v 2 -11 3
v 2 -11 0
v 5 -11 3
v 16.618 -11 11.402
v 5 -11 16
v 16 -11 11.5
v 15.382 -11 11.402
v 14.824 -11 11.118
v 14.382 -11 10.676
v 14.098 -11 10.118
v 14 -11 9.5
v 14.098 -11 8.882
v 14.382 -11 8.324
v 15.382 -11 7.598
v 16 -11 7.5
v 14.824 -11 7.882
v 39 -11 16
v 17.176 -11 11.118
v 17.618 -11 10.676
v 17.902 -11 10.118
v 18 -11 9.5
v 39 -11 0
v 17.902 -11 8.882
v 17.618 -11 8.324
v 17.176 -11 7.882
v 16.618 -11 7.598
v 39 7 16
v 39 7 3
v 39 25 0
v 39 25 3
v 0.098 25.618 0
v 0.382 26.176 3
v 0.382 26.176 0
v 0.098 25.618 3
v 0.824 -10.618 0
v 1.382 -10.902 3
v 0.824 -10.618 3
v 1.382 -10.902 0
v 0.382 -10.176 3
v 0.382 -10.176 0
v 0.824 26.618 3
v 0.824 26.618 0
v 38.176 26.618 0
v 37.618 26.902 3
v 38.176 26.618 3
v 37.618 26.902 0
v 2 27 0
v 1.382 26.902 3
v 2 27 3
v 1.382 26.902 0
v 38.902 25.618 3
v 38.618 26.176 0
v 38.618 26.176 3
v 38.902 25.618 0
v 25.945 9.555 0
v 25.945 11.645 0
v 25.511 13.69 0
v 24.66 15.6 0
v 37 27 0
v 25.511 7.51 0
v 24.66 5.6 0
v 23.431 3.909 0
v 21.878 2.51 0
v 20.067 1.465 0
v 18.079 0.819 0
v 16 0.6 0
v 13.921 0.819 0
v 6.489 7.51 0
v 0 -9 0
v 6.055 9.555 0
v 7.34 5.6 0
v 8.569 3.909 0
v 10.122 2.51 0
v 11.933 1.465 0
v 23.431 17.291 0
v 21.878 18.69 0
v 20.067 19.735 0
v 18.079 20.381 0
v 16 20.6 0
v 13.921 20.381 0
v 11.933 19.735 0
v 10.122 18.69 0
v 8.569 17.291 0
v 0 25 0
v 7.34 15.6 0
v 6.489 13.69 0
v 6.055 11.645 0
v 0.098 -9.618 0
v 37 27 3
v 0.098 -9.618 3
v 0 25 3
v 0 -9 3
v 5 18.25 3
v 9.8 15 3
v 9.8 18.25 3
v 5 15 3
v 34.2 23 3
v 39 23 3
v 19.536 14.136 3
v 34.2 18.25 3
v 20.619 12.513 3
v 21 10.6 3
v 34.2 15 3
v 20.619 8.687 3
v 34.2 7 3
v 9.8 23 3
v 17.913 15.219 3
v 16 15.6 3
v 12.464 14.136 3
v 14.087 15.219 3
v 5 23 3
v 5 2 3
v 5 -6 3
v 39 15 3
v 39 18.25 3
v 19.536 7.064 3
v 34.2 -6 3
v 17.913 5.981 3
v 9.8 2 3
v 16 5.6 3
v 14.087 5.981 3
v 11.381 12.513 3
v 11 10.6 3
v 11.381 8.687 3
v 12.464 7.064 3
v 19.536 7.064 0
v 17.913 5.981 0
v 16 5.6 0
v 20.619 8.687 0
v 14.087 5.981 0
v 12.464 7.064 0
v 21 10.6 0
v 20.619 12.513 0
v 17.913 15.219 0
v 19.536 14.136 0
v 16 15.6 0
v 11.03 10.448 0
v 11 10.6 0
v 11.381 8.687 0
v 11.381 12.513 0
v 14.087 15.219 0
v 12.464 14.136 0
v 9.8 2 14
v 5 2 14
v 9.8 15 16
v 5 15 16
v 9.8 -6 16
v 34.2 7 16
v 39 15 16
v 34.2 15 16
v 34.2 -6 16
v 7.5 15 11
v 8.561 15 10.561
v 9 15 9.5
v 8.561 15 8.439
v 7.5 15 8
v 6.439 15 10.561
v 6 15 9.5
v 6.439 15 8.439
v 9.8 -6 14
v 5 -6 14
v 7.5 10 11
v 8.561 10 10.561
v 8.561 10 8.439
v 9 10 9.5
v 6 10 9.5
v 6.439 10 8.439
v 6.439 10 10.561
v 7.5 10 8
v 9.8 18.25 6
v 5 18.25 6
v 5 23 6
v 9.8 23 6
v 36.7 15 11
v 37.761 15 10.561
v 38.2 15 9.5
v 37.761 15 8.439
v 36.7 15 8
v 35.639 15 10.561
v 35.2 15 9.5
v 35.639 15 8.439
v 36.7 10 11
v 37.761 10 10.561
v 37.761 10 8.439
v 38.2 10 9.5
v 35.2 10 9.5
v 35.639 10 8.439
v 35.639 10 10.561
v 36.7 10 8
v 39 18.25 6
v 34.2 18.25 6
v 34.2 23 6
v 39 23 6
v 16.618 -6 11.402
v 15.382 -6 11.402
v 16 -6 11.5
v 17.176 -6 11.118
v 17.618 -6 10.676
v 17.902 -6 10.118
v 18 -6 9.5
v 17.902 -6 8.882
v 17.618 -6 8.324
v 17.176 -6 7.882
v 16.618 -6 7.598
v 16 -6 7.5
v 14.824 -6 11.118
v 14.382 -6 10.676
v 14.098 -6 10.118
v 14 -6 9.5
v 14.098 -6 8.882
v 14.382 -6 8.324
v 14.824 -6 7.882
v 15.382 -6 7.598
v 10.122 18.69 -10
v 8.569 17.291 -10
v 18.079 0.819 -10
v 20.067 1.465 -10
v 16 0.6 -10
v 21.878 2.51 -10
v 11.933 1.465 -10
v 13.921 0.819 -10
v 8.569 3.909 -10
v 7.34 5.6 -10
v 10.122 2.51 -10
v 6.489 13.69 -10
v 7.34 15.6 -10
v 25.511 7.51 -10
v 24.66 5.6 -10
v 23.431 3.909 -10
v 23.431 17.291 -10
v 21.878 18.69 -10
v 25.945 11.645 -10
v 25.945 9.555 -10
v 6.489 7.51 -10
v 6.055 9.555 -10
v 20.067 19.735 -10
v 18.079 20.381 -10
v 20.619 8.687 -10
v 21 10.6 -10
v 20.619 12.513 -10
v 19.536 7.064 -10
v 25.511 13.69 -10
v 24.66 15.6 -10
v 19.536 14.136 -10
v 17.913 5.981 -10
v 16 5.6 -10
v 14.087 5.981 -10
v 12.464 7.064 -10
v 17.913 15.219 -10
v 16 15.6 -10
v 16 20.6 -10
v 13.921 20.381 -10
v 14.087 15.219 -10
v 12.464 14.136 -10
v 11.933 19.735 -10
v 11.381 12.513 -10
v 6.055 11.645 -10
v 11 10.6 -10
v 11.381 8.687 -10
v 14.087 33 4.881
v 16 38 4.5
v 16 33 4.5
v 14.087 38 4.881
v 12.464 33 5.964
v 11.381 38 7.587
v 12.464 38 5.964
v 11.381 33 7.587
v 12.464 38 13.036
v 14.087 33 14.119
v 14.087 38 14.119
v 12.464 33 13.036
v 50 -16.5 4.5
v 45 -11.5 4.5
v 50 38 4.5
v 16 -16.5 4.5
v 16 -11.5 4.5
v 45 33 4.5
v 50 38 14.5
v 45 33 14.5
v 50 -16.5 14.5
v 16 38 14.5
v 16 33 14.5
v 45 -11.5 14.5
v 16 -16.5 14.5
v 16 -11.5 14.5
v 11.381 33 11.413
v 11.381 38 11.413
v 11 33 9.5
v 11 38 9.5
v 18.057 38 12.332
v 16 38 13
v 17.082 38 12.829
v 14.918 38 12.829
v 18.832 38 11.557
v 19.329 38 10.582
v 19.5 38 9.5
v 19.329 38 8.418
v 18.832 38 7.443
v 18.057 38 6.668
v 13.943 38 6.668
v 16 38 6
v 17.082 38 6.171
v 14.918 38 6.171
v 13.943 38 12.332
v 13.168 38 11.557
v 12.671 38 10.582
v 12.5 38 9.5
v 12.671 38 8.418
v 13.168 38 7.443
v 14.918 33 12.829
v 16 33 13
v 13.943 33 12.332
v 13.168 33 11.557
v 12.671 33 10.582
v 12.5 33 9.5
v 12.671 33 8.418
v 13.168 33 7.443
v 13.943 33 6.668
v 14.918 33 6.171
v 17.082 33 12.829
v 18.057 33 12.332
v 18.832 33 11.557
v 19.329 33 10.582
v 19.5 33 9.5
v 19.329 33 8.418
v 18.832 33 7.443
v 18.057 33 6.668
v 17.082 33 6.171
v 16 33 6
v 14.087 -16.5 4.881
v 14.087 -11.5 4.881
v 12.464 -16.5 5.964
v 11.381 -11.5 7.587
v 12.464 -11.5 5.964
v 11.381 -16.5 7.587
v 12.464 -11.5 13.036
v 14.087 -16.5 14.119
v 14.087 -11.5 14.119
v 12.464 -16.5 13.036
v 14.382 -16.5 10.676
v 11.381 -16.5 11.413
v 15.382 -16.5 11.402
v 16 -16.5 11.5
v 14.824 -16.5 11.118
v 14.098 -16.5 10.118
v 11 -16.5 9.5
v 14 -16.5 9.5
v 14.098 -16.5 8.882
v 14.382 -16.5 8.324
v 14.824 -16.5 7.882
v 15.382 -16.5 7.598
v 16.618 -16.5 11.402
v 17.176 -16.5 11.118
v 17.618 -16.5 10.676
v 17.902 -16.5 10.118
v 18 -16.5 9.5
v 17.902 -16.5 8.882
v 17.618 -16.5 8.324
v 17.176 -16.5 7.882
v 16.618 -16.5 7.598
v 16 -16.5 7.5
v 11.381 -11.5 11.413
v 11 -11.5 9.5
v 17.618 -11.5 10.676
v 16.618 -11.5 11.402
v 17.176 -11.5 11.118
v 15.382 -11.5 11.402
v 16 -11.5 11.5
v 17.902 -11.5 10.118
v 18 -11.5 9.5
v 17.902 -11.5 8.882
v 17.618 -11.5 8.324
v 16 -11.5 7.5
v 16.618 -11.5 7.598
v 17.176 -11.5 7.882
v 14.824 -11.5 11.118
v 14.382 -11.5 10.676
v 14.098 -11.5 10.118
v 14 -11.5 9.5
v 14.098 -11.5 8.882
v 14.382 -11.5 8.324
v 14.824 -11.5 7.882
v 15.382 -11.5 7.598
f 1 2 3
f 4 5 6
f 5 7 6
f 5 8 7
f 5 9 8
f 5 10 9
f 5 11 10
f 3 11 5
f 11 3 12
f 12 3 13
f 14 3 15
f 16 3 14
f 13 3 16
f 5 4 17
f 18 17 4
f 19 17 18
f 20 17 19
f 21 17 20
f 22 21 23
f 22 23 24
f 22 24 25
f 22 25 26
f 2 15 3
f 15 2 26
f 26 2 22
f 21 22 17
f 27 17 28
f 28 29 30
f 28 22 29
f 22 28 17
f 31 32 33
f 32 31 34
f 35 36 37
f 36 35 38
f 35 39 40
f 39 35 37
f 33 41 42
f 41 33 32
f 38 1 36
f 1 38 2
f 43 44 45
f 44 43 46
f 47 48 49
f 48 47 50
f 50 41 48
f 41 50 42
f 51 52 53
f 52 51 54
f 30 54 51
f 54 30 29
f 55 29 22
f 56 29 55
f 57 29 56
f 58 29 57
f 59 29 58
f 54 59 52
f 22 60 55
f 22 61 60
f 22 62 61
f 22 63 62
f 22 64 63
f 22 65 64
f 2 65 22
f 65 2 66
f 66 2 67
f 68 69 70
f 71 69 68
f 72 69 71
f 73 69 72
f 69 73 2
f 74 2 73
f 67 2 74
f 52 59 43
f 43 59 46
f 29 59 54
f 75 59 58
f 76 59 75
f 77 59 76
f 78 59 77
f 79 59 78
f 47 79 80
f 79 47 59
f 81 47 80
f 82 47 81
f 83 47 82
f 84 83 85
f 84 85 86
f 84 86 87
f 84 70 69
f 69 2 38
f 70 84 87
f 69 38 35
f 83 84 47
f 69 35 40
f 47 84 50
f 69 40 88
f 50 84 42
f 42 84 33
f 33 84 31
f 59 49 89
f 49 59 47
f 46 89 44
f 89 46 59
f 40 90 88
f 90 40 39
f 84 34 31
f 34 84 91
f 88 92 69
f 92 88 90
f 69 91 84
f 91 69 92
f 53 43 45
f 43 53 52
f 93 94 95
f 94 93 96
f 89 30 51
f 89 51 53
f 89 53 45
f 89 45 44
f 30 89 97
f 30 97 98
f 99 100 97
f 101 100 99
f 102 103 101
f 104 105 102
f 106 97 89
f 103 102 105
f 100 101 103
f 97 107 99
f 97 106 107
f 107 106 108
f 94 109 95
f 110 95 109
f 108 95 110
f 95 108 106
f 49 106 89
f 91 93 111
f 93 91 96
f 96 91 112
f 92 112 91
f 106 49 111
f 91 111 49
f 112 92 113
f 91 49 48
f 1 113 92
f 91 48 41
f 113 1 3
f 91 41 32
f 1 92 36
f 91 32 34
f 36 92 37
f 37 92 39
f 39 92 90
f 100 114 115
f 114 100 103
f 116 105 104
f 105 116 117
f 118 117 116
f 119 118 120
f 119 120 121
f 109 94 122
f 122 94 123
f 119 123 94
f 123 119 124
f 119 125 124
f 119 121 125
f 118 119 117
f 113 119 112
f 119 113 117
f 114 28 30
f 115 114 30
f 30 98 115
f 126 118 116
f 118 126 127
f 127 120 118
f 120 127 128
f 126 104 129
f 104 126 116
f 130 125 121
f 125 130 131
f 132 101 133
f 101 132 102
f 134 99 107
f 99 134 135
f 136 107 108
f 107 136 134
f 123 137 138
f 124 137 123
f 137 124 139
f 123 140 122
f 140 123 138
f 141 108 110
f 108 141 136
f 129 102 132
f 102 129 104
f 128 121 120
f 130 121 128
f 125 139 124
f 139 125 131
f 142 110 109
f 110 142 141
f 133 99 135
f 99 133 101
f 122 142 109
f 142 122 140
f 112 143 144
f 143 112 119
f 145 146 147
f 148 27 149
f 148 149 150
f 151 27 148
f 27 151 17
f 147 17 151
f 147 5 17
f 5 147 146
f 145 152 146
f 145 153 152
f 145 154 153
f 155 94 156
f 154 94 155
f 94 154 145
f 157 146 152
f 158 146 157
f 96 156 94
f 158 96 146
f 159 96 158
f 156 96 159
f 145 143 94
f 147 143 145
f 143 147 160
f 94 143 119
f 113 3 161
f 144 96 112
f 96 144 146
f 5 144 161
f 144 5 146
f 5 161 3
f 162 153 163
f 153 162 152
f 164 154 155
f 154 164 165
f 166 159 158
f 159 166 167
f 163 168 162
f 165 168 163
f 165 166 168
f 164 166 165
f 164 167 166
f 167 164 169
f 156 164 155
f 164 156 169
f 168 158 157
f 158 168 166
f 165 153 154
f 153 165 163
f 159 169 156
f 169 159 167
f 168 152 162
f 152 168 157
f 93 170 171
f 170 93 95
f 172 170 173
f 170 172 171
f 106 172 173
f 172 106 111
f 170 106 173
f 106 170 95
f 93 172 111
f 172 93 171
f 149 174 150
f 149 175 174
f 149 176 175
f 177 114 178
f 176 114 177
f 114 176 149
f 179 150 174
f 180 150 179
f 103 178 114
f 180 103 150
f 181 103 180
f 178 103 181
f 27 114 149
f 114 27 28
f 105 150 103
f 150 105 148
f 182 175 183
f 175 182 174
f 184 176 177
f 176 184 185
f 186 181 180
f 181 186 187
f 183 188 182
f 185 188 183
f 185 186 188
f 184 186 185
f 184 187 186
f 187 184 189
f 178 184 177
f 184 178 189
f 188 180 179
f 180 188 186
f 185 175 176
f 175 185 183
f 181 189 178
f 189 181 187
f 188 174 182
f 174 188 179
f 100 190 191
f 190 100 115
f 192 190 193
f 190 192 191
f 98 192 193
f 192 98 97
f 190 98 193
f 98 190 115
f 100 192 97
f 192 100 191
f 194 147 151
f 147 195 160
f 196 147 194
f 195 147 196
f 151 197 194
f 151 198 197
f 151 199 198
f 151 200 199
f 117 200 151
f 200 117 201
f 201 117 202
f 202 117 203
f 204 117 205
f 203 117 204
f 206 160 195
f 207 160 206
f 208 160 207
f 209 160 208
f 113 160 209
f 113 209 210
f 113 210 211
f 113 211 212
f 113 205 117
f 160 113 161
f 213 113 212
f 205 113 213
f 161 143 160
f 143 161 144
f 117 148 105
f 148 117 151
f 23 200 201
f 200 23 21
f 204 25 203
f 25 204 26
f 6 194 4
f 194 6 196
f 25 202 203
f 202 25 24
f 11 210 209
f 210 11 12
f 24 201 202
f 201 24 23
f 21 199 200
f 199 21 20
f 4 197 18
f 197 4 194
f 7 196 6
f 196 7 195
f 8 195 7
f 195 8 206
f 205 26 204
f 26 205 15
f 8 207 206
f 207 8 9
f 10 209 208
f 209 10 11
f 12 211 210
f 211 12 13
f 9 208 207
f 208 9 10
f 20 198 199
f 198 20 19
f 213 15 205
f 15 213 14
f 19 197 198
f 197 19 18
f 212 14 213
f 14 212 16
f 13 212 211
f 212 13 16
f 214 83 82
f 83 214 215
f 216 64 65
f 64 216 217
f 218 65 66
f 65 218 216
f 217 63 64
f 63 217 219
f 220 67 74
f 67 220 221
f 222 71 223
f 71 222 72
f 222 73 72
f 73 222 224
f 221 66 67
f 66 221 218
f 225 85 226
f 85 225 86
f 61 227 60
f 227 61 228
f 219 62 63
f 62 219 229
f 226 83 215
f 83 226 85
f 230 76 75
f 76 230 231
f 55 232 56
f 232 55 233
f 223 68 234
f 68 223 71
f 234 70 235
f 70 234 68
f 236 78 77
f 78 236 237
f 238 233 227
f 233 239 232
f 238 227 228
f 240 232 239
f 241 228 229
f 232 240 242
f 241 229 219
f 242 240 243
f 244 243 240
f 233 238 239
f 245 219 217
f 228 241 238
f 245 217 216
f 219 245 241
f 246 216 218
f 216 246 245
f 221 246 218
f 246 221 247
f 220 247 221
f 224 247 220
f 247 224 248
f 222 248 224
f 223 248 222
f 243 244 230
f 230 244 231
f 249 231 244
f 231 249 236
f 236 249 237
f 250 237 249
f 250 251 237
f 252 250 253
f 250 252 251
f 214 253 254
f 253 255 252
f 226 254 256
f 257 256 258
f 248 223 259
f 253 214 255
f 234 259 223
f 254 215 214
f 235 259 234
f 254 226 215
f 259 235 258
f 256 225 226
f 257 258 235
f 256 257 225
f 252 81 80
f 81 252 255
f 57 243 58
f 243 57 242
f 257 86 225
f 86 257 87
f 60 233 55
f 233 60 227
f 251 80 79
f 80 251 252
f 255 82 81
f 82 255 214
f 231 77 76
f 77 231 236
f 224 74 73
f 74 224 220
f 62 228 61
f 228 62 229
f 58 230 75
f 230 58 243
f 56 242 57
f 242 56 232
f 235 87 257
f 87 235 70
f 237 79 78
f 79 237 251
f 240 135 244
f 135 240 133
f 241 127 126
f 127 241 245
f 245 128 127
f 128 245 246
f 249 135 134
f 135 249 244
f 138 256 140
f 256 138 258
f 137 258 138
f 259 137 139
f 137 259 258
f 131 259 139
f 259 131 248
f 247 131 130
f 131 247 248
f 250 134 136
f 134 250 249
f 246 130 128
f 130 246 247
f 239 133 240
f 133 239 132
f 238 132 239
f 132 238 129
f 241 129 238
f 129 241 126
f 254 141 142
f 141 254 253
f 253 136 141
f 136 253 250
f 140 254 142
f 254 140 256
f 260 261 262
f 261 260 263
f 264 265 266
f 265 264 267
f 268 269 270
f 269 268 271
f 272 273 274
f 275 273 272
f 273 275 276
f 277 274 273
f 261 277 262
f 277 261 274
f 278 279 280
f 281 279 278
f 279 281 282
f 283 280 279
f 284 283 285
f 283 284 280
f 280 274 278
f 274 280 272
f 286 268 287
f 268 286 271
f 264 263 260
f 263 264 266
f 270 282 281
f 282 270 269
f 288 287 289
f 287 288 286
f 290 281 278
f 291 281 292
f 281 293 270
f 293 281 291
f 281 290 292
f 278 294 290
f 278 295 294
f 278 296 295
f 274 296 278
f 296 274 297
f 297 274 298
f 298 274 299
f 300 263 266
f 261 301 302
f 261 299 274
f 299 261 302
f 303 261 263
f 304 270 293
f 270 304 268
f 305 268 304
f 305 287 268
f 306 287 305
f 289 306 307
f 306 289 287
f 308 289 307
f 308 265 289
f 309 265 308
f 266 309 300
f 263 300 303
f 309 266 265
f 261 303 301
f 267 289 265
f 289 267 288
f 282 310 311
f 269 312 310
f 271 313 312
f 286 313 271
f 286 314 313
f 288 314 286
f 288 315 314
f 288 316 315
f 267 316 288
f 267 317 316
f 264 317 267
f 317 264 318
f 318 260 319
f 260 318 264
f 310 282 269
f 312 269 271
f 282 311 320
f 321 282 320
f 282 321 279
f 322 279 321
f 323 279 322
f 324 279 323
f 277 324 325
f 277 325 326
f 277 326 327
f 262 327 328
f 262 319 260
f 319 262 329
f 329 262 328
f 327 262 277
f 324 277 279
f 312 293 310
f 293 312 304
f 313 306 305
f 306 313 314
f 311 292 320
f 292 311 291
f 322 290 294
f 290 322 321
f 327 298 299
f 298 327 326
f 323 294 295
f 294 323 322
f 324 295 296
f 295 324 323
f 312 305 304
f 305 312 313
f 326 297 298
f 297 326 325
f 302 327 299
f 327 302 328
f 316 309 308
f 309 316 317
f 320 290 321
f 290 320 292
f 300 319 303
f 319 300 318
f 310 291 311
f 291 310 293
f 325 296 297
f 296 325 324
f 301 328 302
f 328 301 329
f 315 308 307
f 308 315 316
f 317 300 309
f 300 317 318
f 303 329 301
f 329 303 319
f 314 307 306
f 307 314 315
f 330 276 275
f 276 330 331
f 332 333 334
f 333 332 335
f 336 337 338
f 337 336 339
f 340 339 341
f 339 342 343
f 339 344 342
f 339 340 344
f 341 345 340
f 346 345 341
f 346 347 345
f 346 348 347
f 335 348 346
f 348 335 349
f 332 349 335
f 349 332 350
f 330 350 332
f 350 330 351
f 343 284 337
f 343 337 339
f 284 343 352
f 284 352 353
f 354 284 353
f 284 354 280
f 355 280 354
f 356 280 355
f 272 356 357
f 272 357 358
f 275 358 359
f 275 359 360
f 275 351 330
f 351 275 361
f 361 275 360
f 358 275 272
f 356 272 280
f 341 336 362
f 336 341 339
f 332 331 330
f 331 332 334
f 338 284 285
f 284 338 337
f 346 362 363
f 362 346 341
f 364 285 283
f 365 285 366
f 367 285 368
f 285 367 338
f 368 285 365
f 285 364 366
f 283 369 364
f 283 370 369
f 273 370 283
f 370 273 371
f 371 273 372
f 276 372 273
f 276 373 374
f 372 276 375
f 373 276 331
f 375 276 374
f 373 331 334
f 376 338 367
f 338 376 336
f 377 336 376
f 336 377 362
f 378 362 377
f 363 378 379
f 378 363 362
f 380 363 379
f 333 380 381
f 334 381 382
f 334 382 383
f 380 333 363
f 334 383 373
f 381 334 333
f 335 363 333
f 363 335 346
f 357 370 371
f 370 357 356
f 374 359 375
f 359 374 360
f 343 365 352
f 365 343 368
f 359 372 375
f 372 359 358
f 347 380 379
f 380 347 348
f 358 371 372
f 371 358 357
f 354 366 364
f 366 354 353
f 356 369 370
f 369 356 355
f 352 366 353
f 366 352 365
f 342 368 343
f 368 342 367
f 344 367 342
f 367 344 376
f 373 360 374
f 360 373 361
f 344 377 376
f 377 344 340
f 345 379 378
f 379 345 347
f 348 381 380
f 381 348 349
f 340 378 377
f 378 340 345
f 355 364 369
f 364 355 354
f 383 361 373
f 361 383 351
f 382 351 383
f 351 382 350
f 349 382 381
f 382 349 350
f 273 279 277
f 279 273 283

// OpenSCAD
// file: ../openscad_libraries/robotics.scad
servo();

translate([0, 60])
micro_servo();

translate([-40, 0])
raspberry_pi_cam();

translate([-25, 45])
led_5mm();

module led_5mm() {
    $fn = 15;

    hull() {
        translate([0, 0, 6.5])
        sphere(d = 5);
        cylinder(h = 6.5, d = 5);
    }

    cylinder(h = 1, d = 6);

    translate([1.25, 0, -10])
    cylinder(h = 10, d = 0.5);

    translate([-1.25, 0, -10])
    cylinder(h = 10, d = 0.5);
}

module raspberry_pi_cam() {
    cube([25, 24, 4]);
    translate([25/2 - 8/2, 5.7, 4])
    cube([8, 8, 5.3]);
    translate([25/2 - 8/2, 5.7+8, 4])
    cube([8, 9, 1.3]);
    translate([25/2 - 21/2, 0, -3])
    cube([21, 6, 3]);
}

module micro_servo() {
    body();
    output_shaft();
    cable();

    height = 13;
    depth = 23;

    module body() {
        $fn = 25;

        cube([depth, 24, height]);

        difference() {
            offset = 5;
            translate([offset, -(32-24)/2])
            cube([3, 32, height]);

            translate([offset+3+0.5, -2.5, height/2])
            rotate([0, -90])
            union() {
                cylinder(h = 4, d = 3);
                translate([0, 28.75])
                cylinder(h = 4, d = 3);
            }
        }

        translate([0, 12/2, height/2])
        rotate([0, -90])
        cylinder(h = 4, d = 12);

        translate([0, 12, height/2])
        rotate([0, -90])
        cylinder(h = 4, d = 5);
    }

    module output_shaft() {
        $fn = 25;
        translate([-4, 12/2, height/2])
        rotate([0, -90])
        cylinder(h = 3.25, d = 4.5);
    }

    module cable() {
        translate([depth-1, -1, height/2 - 4/2])
        cube([2, 2, 4]);
    }
}

module servo() {
    body();
    output_shaft();
    cable();

    height = 20;
    depth = 36;

    module body() {
        $fn = 25;

        cube([depth, 41, height]);

        difference() {
            offset = 7;
            translate([offset, -(56-41)/2])
            cube([3, 56, height]);

            translate([offset+3+0.5, -4.5, 2+5/2])
            rotate([0, -90])
            union() {
                cylinder(h = 4, d = 5);

                translate([10, 0, 0])
                cylinder(h = 4, d = 5);

                translate([0, 50])
                cylinder(h = 4, d = 5);

                translate([10, 50])
                cylinder(h = 4, d = 5);
            }
        }

        translate([0, 10, height/2])
        rotate([0, -90])
        cylinder(h = 4, d = 14);
    }

    module output_shaft() {
        $fn = 25;
        translate([-4, 10, height/2])
        rotate([0, -90])
        cylinder(h = 3.25, d = 5.75);
    }

    module cable() {
        translate([depth-1, -1, height/2 - 4/2])
        cube([2, 2, 4]);
    }
}
// main file
use <../openscad_libraries/robotics.scad>

head_pan_tilt_assembly(tilt_angle = $t * 180, pan_angle = ($t * 180) - 90, neck_height = 10);

module head_pan_tilt_assembly(tilt_angle = 0, pan_angle = 0, neck_height = 0, rail_height = 40) {
    translate([16, 11])
    rotate([0, 0, pan_angle])
    translate([-16, -11])
    platform(neck_height);

    translate([16, 11, 10])
    rotate([tilt_angle, 0, pan_angle])
    translate([-16, -11, -10])
    mounting_rail(rail_height = rail_height);

    %translate([6.5, 1, -9 - neck_height])
    rotate([0, 90])
    servo();
}

module mounting_rail(rail_height) {
    difference() {
        arm();

        translate([-20, 0])
        axis(diameter = 7);
    }

    difference() {
        translate([49.5, 0])
        arm();

        translate([20, 0])
        axis();
    }

    translate([-11, rail_height, 4.5])
    cube([54.5, 5, 10]);

    module arm() {
        hull() {
            translate([-6, 11, 9.5])
            rotate([0, -90])
            cylinder(h = 5, d = 10);

            translate([-11, rail_height, 4.5])
            cube([5, 5, 10]);
        }
    }
}



module platform(neck_height = 0) {
    center_x = 43.2/2 - (43.2 - 38);
    center_y = 11;
    difference() {
        base();

        translate([center_x, center_y, -0.5])
        cylinder(h = 20, d = 10);
    }

    mounting_rail();
    translate([0, 29.2])
    mounting_rail();
    bearing();
    neck();

    %translate([4, 5, 3])
    micro_servo();

    module neck() {
        translate([center_x, center_y, -neck_height])
        difference() {
            cylinder(h = neck_height, d = 20);
            cylinder(h = neck_height, d = 10);
        }
    }

    module base() {
        hull() {
            translate([37, 0])
            cube([1, 34, 3]);

            $fn = 20;

            translate([2, 2-5])
            cylinder(h = 3, d = 4);

            translate([38-2, 2-5])
            cylinder(h = 3, d = 4);

            translate([2, 34-2])
            cylinder(h = 3, d = 4);
        }
    }

    module bearing() {
        difference() {
            union () {
                translate([33, 0, 3])
                cube([5, 34, 13]);

                translate([20, 0, 14])
                cube([15, 4.8, 2]);

                translate([20, 29.2, 0])
                cube([15, 4.8, 16]);
            }

            axis();
        }
    }

    module mounting_rail() {
        translate([4, 0, 3])
        cube([4.75, 4.8, 3]);

        difference() {
            translate([12, 0, 3])
            cube([13, 4.8, 13]);

            $fn = 8;
            translate([17, 2.5, 9.5])
            rotate([0, -90])
            cylinder(h = 6, d = 3);
        }
    }
}

// use this for centering the hole
module axis(diameter = 4) {
    $fn = 20;
    translate([38, 11, 9.5])
    rotate([0, -90])
    cylinder(h = 43.2, d = diameter);
}
